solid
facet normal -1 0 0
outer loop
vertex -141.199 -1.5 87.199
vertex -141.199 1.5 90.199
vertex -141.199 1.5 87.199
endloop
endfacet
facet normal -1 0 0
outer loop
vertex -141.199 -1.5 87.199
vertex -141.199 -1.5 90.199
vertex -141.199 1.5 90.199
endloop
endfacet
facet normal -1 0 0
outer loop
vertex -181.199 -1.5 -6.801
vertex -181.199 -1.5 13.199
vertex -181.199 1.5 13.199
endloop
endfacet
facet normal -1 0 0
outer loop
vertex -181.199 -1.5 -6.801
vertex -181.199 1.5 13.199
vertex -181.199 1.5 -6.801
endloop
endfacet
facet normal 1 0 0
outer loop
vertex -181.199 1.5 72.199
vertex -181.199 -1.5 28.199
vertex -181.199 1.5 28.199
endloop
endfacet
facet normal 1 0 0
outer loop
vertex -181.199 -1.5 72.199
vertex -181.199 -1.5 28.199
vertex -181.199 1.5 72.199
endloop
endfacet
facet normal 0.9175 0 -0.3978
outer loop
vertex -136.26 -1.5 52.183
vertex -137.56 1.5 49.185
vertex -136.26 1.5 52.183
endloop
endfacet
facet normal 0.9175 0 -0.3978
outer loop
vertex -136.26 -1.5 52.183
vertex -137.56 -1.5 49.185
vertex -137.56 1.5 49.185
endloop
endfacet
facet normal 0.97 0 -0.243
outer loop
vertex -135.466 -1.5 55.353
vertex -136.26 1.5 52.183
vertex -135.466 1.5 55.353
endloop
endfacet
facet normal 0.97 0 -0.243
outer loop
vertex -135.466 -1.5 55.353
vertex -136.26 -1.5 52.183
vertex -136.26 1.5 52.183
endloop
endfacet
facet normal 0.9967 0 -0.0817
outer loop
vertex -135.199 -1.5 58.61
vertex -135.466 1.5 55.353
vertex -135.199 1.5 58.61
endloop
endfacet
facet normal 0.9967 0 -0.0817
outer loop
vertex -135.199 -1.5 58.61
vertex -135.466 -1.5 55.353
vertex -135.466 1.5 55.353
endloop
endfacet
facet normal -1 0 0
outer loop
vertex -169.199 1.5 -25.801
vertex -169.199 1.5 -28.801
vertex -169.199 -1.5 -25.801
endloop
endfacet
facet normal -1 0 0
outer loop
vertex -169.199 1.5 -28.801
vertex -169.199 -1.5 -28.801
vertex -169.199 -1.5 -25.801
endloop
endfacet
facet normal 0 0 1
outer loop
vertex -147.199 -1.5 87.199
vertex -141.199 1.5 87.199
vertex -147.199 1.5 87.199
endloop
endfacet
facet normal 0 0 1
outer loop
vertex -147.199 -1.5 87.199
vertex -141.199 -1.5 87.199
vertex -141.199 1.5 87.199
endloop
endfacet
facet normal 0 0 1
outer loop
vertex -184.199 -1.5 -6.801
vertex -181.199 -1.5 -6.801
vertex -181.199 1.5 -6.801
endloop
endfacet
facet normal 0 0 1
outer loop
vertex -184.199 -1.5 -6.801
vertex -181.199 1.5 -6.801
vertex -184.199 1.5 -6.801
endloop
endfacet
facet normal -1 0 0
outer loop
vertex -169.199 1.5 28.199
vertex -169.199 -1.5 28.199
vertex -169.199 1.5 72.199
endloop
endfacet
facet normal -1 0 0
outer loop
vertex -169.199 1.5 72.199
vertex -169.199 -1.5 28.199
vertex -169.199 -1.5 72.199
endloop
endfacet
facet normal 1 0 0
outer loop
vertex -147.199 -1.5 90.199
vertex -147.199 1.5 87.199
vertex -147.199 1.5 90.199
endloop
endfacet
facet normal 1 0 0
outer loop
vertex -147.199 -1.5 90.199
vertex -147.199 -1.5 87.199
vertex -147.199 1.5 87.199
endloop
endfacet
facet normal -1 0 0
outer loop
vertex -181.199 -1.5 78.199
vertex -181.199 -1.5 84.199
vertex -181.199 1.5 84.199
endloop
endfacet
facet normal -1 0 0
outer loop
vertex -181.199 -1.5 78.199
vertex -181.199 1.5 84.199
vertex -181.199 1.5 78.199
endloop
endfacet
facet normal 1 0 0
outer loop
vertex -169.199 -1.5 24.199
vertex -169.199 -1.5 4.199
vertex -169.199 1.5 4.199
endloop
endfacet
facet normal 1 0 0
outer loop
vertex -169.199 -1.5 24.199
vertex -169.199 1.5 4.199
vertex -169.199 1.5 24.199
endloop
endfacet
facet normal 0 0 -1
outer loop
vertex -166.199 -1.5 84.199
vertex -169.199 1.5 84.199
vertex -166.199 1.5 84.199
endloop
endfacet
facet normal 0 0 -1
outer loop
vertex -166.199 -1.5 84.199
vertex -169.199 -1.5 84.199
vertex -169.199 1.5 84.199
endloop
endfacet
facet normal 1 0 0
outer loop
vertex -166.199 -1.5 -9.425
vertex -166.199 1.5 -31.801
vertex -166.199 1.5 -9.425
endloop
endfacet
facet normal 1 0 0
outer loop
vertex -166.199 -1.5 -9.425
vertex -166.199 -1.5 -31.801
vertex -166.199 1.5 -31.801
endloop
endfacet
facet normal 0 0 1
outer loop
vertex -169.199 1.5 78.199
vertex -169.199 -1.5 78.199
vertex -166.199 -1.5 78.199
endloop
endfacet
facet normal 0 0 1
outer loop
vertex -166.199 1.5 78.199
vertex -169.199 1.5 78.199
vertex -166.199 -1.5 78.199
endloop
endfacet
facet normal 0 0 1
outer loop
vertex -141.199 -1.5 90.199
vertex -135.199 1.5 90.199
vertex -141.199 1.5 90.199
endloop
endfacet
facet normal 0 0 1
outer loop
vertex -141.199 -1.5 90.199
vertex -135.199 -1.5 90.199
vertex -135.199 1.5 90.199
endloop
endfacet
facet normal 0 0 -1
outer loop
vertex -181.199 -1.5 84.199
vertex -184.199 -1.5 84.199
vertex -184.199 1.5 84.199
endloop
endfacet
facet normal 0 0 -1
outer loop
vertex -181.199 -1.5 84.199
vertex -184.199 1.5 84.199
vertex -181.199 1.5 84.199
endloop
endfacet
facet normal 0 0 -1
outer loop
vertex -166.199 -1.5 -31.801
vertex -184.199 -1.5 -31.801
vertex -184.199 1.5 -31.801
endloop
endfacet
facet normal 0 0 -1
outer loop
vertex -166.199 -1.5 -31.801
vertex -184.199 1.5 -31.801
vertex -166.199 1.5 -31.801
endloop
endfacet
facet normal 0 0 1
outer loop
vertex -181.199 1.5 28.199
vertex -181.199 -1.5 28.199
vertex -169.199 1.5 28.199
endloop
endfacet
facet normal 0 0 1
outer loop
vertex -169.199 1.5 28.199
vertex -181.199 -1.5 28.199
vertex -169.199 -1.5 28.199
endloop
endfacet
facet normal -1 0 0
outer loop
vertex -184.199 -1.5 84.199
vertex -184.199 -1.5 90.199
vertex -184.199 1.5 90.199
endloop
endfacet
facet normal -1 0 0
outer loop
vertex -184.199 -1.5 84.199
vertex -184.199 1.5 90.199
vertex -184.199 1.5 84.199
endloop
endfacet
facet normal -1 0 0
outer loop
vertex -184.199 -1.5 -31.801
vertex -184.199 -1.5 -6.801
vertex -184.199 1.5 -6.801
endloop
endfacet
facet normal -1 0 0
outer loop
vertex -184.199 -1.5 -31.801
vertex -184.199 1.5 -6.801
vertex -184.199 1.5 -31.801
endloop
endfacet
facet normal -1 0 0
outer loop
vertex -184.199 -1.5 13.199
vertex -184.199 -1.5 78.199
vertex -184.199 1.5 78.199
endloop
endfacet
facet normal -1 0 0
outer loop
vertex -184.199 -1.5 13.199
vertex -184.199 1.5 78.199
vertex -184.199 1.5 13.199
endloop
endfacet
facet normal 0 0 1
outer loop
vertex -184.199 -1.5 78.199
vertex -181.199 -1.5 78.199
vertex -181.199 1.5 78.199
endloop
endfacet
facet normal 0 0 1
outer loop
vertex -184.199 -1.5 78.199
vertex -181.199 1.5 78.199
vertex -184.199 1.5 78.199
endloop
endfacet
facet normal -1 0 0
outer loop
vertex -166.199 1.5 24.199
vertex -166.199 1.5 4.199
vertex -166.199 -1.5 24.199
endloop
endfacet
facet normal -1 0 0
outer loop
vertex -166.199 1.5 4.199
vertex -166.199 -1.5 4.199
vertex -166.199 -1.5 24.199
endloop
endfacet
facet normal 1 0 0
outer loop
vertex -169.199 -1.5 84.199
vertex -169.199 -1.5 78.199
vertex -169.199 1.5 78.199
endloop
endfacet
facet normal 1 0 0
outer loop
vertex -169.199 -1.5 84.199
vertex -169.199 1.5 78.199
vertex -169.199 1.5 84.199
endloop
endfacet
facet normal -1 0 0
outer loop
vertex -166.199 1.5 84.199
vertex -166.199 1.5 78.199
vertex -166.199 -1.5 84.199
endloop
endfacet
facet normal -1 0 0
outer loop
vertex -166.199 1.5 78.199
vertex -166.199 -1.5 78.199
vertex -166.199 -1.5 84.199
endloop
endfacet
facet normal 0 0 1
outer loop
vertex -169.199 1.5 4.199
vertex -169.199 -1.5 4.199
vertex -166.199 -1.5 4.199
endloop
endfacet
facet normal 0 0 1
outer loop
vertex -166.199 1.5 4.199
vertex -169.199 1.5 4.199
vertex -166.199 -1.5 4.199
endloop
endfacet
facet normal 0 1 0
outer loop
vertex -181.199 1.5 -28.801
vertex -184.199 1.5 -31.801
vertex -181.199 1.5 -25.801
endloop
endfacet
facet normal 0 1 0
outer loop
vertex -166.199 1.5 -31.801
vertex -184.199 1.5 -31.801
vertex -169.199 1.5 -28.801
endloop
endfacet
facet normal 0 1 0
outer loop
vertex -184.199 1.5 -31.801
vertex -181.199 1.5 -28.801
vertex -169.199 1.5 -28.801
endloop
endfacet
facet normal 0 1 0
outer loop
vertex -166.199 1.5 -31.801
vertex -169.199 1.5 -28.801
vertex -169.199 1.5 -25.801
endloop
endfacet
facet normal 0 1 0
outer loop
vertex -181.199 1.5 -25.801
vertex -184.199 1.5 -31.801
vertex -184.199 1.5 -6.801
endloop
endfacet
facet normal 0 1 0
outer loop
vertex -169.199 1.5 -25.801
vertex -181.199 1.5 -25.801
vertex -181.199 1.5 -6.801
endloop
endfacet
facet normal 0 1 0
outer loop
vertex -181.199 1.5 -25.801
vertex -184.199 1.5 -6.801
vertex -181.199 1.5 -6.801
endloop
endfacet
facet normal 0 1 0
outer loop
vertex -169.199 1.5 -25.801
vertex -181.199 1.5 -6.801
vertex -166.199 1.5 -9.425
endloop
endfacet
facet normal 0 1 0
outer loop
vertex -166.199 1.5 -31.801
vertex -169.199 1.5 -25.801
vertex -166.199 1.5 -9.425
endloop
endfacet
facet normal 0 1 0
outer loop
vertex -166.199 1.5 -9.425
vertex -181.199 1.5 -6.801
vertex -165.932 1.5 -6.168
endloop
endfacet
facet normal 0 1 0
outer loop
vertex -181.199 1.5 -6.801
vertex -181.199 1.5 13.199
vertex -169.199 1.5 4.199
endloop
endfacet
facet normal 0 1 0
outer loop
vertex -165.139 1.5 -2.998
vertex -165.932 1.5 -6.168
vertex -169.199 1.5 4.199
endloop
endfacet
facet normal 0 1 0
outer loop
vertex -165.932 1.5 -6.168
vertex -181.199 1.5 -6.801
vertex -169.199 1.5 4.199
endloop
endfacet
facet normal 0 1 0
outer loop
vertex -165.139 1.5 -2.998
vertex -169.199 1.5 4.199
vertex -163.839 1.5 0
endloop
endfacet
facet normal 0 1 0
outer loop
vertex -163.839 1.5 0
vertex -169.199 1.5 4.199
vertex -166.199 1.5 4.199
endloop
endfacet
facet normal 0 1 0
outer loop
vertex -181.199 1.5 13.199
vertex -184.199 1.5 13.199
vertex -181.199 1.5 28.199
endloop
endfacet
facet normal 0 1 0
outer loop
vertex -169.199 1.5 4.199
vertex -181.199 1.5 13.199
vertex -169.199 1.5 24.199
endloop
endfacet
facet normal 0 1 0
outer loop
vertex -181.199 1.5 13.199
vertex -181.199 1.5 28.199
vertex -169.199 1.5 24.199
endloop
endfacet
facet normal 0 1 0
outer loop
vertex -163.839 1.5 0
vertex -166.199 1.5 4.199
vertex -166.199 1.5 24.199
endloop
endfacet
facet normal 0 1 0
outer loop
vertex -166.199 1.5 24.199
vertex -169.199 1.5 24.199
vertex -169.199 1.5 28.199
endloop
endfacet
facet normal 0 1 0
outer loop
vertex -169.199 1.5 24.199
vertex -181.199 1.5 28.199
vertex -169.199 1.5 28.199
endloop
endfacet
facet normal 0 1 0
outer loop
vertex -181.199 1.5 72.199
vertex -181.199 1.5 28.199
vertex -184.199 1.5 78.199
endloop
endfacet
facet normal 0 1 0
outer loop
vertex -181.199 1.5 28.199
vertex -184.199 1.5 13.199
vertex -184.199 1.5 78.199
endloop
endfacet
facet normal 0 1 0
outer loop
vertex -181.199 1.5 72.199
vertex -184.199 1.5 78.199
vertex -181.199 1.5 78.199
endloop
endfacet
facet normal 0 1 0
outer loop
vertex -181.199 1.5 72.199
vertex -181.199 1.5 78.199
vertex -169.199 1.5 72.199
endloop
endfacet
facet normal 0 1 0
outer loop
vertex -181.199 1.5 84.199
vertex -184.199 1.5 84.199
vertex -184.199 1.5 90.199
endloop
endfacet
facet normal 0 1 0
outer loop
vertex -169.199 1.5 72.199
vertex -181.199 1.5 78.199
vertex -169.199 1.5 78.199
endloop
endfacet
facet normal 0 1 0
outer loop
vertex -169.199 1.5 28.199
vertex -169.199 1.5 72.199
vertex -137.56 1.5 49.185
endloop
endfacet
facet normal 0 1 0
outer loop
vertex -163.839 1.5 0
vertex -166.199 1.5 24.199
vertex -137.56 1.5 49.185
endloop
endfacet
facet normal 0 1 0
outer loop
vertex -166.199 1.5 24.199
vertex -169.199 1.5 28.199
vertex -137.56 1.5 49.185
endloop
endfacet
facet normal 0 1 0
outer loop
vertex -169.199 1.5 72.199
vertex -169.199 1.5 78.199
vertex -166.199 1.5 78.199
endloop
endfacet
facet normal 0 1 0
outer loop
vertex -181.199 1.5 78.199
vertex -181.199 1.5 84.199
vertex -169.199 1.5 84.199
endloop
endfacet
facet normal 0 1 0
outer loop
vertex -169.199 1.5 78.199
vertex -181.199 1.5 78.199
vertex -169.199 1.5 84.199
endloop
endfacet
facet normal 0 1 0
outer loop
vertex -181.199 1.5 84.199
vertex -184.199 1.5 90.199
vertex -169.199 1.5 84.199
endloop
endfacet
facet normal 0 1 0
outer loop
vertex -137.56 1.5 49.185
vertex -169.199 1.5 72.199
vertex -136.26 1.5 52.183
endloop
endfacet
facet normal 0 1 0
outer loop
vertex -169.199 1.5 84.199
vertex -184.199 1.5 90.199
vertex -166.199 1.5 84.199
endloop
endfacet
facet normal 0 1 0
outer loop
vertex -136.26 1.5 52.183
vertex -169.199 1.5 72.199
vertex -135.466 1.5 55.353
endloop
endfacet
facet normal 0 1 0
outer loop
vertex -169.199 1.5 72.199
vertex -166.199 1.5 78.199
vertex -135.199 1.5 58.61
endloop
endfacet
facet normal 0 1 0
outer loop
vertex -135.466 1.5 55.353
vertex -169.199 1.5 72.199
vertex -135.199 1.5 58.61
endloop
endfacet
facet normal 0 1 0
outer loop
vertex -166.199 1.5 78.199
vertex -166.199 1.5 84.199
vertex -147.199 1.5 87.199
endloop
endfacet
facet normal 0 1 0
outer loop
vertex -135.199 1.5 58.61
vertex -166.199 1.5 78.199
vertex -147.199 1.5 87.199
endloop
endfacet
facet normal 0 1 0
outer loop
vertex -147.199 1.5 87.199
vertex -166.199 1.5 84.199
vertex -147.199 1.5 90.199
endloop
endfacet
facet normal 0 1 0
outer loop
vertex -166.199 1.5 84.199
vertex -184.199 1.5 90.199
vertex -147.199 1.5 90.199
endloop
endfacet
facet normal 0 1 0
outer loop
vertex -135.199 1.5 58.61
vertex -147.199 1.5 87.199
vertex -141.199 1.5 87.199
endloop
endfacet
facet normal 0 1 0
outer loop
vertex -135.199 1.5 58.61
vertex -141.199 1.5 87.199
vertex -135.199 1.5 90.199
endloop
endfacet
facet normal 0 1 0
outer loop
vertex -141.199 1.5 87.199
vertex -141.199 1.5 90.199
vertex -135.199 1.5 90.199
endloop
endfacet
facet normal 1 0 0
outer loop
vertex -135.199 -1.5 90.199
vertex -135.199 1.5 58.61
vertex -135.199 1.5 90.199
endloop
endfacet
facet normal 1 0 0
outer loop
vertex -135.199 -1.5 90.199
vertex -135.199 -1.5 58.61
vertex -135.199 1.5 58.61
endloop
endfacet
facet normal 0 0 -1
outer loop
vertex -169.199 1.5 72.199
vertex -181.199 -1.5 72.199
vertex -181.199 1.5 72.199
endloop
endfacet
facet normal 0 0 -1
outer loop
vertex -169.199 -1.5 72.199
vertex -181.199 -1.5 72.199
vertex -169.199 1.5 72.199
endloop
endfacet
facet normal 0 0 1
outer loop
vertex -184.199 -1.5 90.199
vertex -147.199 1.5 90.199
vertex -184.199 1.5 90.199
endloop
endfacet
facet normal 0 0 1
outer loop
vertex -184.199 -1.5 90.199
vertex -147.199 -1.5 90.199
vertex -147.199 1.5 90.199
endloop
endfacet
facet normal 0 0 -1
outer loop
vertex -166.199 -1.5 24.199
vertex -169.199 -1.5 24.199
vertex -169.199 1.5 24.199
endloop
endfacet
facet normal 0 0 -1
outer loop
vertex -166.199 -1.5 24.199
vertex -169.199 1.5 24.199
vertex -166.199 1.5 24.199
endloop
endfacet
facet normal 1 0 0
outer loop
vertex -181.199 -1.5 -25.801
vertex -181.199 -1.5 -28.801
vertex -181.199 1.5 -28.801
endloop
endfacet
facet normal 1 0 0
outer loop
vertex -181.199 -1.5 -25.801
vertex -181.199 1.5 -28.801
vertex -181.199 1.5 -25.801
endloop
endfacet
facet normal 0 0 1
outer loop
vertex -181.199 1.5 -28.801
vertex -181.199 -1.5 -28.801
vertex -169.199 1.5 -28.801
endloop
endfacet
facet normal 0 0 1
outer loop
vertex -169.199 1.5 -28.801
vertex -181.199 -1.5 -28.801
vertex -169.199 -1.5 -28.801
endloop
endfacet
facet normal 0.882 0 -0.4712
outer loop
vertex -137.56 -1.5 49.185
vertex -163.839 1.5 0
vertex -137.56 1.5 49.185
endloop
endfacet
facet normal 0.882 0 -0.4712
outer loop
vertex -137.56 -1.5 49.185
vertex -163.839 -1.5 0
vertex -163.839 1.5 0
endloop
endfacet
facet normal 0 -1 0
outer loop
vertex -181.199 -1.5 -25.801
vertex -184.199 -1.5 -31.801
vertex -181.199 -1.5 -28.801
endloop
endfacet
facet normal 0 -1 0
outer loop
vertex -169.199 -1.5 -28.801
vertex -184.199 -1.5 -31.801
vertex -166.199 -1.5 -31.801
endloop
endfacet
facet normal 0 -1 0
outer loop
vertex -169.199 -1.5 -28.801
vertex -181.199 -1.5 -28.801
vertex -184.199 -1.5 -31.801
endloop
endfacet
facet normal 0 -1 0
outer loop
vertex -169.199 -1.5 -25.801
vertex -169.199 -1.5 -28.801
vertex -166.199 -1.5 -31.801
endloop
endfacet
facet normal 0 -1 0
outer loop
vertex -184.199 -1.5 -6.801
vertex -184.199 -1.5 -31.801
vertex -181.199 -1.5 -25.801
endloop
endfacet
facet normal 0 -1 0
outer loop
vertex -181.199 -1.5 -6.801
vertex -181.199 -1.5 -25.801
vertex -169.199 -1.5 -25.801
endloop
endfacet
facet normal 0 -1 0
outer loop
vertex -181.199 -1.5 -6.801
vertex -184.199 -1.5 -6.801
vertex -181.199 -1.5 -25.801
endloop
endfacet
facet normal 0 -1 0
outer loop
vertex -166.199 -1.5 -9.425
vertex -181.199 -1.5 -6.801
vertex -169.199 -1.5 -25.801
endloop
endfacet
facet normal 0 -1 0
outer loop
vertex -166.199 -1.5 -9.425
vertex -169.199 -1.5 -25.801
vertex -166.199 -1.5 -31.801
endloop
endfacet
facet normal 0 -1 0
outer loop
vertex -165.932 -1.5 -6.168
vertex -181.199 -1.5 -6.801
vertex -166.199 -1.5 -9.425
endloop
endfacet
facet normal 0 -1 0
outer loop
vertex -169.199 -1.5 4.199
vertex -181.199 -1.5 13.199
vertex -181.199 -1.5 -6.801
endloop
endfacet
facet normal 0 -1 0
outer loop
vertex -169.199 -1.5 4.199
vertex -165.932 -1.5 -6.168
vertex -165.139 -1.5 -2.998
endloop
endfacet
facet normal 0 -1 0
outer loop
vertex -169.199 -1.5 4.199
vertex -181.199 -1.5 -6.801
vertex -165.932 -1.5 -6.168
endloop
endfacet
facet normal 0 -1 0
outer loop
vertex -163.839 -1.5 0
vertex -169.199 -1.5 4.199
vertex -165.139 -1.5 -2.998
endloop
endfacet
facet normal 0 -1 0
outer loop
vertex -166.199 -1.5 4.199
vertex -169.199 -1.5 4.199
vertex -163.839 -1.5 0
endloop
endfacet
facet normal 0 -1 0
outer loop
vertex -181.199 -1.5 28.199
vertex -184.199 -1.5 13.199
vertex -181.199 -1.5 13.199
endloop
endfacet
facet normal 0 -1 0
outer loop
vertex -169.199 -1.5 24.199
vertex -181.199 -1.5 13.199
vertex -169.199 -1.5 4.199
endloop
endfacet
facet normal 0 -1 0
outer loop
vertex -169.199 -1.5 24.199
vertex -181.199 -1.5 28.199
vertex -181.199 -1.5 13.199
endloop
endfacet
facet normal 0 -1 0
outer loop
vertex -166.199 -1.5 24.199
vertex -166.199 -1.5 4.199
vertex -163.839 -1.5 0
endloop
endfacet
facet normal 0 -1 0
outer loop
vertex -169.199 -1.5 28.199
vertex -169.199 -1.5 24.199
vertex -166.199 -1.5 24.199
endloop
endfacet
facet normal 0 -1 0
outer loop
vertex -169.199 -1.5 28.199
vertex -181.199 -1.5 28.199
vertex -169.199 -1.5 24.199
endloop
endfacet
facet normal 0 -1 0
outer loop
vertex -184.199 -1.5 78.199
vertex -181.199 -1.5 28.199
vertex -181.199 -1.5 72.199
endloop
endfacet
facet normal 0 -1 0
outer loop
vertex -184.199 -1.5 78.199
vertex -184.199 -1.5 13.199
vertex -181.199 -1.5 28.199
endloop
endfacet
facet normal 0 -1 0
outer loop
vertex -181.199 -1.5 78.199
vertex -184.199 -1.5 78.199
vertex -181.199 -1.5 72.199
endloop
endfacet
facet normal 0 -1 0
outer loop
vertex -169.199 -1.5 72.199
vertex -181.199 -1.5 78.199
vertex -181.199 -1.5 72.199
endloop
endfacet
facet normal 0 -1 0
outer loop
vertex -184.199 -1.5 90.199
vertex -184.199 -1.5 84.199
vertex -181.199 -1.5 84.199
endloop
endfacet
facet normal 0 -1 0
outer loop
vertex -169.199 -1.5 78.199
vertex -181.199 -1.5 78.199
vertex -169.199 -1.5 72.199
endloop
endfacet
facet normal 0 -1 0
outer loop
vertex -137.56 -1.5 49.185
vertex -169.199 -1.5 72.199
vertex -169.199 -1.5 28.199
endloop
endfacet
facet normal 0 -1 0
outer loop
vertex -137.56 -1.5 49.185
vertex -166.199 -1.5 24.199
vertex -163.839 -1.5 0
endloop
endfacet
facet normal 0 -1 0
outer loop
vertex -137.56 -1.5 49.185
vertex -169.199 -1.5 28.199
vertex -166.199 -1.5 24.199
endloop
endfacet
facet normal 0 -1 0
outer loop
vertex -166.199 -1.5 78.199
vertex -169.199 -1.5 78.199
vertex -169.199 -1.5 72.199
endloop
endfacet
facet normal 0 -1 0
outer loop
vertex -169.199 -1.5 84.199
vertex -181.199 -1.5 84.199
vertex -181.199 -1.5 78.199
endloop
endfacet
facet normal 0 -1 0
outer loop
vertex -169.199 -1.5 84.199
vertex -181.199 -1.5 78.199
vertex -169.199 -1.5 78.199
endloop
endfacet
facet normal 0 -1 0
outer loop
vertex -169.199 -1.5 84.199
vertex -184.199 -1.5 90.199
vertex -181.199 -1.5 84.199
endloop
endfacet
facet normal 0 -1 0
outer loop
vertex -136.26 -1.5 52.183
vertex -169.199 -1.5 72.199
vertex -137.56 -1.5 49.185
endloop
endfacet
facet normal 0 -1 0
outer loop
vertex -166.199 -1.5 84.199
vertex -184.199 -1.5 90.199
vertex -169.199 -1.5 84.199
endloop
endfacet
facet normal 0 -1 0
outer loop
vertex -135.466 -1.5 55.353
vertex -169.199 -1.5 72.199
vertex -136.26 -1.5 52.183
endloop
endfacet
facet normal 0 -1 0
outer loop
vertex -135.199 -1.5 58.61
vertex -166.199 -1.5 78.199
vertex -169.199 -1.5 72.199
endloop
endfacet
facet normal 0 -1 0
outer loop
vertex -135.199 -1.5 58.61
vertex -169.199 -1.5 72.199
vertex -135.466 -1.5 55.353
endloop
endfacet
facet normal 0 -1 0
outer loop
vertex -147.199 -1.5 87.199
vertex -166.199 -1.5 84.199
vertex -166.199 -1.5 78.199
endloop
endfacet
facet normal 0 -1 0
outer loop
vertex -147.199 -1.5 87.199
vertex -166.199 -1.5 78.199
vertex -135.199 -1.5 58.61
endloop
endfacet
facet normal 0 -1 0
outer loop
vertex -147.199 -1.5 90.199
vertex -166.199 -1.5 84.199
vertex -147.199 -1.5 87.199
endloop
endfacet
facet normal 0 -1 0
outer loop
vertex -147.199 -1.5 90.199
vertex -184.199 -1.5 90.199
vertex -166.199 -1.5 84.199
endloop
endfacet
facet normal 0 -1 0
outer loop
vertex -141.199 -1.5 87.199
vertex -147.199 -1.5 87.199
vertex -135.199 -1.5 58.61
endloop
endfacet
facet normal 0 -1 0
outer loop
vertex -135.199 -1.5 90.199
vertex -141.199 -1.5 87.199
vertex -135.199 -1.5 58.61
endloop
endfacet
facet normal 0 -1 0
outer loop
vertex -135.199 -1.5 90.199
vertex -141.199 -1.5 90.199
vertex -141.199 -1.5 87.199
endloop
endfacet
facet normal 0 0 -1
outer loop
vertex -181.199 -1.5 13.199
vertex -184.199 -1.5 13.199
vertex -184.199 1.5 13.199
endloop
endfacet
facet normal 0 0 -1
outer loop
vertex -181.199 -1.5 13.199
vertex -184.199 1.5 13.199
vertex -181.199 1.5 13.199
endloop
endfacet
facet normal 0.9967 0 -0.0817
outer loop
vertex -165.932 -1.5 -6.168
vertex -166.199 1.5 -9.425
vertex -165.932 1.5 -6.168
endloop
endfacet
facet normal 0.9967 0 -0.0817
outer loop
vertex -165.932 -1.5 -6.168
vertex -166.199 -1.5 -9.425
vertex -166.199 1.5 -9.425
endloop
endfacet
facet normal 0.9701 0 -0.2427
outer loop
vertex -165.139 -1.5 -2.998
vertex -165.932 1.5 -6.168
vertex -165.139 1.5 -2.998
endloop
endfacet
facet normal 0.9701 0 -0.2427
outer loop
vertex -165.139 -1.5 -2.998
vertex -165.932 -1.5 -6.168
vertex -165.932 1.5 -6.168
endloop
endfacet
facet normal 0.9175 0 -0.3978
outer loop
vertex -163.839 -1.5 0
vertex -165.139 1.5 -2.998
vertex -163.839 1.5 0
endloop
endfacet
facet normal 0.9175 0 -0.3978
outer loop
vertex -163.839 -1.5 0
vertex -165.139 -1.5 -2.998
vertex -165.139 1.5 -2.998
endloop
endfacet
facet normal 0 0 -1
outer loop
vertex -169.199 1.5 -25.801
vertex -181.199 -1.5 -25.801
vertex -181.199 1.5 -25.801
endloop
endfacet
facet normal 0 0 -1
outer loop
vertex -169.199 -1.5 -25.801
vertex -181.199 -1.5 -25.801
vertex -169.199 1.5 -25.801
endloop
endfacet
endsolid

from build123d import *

# Parameters (mm, degrees)
F0_W     = 12
F0_H     = 3
F0_W_2   = 3
F0_H_2   = 20
F0_H_3   = 44
F0_H_4   = 6
F1_DEPTH = 1.5
F3_DEPTH = 1.5


# Not quite as in the source:
# - a feature of the source that left no trace in its solid (it failed there, or was rolled back) is left out


with BuildPart() as f1:
    # F0 (on Front) → F1 (new body, symmetric)
    with BuildSketch(Plane.XZ):
        with BuildLine():
            Line((-147.1994572369, 90.198807884), (-184.1994572369, 90.198807884))
            Line((-184.1994572369, 90.198807884), (-184.1994572369, 84.198807884))
            Line((-184.1994572369, 84.198807884), (-181.1994572369, 84.198807884))
            Line((-181.1994572369, 84.198807884), (-181.1994572369, 78.198807884))
            Line((-181.1994572369, 78.198807884), (-184.1994572369, 78.198807884))
            Line((-184.1994572369, 78.198807884), (-184.1994572369, 13.198807884))
            Line((-184.1994572369, 13.198807884), (-181.1994572369, 13.198807884))
            Line((-181.1994572369, 13.198807884), (-181.1994572369, -6.801192116))
            Line((-181.1994572369, -6.801192116), (-184.1994572369, -6.801192116))
            Line((-184.1994572369, -6.801192116), (-184.1994572369, -31.801192116))
            Line((-184.1994572369, -31.801192116), (-166.1994572369, -31.801192116))
            Line((-166.1994572369, -31.801192116), (-166.1994572369, -9.4251137796))
            ThreePointArc((-166.1994572369, -9.4251137796), (-165.6004708263, -4.5670615257), (-163.8393900667, 0))
            Line((-163.8393900667, 0), (-137.559524407, 49.1850895229))
            ThreePointArc((-137.559524407, 49.1850895229), (-135.7984436474, 53.7521510486), (-135.1994572369, 58.6102033025))
            Line((-135.1994572369, 58.6102033025), (-135.1994572369, 90.198807884))
            Line((-135.1994572369, 90.198807884), (-141.1994572369, 90.198807884))
            Line((-141.1994572369, 90.198807884), (-141.1994572369, 87.198807884))
            Line((-141.1994572369, 87.198807884), (-147.1994572369, 87.198807884))
            Line((-147.1994572369, 87.198807884), (-147.1994572369, 90.198807884))
        make_face()
        with Locations((-175.1994572369, -27.301192116)):
            Rectangle(F0_W, F0_H, mode=Mode.SUBTRACT)
        with Locations((-167.6994572369, 14.198807884)):
            Rectangle(F0_W_2, F0_H_2, mode=Mode.SUBTRACT)
        with Locations((-175.1994572369, 50.198807884)):
            Rectangle(F0_W, F0_H_3, mode=Mode.SUBTRACT)
        with Locations((-167.6994572369, 81.198807884)):
            Rectangle(F0_W_2, F0_H_4, mode=Mode.SUBTRACT)
    extrude(amount=F1_DEPTH, both=True)

    # F0 (on Front) → F3 (cut, symmetric)
    with BuildSketch(Plane.XZ):
        with Locations((-175.1994572369, -27.301192116)):
            Rectangle(F0_W, F0_H)
    extrude(amount=F3_DEPTH, both=True, mode=Mode.SUBTRACT)


solid = f1.part
